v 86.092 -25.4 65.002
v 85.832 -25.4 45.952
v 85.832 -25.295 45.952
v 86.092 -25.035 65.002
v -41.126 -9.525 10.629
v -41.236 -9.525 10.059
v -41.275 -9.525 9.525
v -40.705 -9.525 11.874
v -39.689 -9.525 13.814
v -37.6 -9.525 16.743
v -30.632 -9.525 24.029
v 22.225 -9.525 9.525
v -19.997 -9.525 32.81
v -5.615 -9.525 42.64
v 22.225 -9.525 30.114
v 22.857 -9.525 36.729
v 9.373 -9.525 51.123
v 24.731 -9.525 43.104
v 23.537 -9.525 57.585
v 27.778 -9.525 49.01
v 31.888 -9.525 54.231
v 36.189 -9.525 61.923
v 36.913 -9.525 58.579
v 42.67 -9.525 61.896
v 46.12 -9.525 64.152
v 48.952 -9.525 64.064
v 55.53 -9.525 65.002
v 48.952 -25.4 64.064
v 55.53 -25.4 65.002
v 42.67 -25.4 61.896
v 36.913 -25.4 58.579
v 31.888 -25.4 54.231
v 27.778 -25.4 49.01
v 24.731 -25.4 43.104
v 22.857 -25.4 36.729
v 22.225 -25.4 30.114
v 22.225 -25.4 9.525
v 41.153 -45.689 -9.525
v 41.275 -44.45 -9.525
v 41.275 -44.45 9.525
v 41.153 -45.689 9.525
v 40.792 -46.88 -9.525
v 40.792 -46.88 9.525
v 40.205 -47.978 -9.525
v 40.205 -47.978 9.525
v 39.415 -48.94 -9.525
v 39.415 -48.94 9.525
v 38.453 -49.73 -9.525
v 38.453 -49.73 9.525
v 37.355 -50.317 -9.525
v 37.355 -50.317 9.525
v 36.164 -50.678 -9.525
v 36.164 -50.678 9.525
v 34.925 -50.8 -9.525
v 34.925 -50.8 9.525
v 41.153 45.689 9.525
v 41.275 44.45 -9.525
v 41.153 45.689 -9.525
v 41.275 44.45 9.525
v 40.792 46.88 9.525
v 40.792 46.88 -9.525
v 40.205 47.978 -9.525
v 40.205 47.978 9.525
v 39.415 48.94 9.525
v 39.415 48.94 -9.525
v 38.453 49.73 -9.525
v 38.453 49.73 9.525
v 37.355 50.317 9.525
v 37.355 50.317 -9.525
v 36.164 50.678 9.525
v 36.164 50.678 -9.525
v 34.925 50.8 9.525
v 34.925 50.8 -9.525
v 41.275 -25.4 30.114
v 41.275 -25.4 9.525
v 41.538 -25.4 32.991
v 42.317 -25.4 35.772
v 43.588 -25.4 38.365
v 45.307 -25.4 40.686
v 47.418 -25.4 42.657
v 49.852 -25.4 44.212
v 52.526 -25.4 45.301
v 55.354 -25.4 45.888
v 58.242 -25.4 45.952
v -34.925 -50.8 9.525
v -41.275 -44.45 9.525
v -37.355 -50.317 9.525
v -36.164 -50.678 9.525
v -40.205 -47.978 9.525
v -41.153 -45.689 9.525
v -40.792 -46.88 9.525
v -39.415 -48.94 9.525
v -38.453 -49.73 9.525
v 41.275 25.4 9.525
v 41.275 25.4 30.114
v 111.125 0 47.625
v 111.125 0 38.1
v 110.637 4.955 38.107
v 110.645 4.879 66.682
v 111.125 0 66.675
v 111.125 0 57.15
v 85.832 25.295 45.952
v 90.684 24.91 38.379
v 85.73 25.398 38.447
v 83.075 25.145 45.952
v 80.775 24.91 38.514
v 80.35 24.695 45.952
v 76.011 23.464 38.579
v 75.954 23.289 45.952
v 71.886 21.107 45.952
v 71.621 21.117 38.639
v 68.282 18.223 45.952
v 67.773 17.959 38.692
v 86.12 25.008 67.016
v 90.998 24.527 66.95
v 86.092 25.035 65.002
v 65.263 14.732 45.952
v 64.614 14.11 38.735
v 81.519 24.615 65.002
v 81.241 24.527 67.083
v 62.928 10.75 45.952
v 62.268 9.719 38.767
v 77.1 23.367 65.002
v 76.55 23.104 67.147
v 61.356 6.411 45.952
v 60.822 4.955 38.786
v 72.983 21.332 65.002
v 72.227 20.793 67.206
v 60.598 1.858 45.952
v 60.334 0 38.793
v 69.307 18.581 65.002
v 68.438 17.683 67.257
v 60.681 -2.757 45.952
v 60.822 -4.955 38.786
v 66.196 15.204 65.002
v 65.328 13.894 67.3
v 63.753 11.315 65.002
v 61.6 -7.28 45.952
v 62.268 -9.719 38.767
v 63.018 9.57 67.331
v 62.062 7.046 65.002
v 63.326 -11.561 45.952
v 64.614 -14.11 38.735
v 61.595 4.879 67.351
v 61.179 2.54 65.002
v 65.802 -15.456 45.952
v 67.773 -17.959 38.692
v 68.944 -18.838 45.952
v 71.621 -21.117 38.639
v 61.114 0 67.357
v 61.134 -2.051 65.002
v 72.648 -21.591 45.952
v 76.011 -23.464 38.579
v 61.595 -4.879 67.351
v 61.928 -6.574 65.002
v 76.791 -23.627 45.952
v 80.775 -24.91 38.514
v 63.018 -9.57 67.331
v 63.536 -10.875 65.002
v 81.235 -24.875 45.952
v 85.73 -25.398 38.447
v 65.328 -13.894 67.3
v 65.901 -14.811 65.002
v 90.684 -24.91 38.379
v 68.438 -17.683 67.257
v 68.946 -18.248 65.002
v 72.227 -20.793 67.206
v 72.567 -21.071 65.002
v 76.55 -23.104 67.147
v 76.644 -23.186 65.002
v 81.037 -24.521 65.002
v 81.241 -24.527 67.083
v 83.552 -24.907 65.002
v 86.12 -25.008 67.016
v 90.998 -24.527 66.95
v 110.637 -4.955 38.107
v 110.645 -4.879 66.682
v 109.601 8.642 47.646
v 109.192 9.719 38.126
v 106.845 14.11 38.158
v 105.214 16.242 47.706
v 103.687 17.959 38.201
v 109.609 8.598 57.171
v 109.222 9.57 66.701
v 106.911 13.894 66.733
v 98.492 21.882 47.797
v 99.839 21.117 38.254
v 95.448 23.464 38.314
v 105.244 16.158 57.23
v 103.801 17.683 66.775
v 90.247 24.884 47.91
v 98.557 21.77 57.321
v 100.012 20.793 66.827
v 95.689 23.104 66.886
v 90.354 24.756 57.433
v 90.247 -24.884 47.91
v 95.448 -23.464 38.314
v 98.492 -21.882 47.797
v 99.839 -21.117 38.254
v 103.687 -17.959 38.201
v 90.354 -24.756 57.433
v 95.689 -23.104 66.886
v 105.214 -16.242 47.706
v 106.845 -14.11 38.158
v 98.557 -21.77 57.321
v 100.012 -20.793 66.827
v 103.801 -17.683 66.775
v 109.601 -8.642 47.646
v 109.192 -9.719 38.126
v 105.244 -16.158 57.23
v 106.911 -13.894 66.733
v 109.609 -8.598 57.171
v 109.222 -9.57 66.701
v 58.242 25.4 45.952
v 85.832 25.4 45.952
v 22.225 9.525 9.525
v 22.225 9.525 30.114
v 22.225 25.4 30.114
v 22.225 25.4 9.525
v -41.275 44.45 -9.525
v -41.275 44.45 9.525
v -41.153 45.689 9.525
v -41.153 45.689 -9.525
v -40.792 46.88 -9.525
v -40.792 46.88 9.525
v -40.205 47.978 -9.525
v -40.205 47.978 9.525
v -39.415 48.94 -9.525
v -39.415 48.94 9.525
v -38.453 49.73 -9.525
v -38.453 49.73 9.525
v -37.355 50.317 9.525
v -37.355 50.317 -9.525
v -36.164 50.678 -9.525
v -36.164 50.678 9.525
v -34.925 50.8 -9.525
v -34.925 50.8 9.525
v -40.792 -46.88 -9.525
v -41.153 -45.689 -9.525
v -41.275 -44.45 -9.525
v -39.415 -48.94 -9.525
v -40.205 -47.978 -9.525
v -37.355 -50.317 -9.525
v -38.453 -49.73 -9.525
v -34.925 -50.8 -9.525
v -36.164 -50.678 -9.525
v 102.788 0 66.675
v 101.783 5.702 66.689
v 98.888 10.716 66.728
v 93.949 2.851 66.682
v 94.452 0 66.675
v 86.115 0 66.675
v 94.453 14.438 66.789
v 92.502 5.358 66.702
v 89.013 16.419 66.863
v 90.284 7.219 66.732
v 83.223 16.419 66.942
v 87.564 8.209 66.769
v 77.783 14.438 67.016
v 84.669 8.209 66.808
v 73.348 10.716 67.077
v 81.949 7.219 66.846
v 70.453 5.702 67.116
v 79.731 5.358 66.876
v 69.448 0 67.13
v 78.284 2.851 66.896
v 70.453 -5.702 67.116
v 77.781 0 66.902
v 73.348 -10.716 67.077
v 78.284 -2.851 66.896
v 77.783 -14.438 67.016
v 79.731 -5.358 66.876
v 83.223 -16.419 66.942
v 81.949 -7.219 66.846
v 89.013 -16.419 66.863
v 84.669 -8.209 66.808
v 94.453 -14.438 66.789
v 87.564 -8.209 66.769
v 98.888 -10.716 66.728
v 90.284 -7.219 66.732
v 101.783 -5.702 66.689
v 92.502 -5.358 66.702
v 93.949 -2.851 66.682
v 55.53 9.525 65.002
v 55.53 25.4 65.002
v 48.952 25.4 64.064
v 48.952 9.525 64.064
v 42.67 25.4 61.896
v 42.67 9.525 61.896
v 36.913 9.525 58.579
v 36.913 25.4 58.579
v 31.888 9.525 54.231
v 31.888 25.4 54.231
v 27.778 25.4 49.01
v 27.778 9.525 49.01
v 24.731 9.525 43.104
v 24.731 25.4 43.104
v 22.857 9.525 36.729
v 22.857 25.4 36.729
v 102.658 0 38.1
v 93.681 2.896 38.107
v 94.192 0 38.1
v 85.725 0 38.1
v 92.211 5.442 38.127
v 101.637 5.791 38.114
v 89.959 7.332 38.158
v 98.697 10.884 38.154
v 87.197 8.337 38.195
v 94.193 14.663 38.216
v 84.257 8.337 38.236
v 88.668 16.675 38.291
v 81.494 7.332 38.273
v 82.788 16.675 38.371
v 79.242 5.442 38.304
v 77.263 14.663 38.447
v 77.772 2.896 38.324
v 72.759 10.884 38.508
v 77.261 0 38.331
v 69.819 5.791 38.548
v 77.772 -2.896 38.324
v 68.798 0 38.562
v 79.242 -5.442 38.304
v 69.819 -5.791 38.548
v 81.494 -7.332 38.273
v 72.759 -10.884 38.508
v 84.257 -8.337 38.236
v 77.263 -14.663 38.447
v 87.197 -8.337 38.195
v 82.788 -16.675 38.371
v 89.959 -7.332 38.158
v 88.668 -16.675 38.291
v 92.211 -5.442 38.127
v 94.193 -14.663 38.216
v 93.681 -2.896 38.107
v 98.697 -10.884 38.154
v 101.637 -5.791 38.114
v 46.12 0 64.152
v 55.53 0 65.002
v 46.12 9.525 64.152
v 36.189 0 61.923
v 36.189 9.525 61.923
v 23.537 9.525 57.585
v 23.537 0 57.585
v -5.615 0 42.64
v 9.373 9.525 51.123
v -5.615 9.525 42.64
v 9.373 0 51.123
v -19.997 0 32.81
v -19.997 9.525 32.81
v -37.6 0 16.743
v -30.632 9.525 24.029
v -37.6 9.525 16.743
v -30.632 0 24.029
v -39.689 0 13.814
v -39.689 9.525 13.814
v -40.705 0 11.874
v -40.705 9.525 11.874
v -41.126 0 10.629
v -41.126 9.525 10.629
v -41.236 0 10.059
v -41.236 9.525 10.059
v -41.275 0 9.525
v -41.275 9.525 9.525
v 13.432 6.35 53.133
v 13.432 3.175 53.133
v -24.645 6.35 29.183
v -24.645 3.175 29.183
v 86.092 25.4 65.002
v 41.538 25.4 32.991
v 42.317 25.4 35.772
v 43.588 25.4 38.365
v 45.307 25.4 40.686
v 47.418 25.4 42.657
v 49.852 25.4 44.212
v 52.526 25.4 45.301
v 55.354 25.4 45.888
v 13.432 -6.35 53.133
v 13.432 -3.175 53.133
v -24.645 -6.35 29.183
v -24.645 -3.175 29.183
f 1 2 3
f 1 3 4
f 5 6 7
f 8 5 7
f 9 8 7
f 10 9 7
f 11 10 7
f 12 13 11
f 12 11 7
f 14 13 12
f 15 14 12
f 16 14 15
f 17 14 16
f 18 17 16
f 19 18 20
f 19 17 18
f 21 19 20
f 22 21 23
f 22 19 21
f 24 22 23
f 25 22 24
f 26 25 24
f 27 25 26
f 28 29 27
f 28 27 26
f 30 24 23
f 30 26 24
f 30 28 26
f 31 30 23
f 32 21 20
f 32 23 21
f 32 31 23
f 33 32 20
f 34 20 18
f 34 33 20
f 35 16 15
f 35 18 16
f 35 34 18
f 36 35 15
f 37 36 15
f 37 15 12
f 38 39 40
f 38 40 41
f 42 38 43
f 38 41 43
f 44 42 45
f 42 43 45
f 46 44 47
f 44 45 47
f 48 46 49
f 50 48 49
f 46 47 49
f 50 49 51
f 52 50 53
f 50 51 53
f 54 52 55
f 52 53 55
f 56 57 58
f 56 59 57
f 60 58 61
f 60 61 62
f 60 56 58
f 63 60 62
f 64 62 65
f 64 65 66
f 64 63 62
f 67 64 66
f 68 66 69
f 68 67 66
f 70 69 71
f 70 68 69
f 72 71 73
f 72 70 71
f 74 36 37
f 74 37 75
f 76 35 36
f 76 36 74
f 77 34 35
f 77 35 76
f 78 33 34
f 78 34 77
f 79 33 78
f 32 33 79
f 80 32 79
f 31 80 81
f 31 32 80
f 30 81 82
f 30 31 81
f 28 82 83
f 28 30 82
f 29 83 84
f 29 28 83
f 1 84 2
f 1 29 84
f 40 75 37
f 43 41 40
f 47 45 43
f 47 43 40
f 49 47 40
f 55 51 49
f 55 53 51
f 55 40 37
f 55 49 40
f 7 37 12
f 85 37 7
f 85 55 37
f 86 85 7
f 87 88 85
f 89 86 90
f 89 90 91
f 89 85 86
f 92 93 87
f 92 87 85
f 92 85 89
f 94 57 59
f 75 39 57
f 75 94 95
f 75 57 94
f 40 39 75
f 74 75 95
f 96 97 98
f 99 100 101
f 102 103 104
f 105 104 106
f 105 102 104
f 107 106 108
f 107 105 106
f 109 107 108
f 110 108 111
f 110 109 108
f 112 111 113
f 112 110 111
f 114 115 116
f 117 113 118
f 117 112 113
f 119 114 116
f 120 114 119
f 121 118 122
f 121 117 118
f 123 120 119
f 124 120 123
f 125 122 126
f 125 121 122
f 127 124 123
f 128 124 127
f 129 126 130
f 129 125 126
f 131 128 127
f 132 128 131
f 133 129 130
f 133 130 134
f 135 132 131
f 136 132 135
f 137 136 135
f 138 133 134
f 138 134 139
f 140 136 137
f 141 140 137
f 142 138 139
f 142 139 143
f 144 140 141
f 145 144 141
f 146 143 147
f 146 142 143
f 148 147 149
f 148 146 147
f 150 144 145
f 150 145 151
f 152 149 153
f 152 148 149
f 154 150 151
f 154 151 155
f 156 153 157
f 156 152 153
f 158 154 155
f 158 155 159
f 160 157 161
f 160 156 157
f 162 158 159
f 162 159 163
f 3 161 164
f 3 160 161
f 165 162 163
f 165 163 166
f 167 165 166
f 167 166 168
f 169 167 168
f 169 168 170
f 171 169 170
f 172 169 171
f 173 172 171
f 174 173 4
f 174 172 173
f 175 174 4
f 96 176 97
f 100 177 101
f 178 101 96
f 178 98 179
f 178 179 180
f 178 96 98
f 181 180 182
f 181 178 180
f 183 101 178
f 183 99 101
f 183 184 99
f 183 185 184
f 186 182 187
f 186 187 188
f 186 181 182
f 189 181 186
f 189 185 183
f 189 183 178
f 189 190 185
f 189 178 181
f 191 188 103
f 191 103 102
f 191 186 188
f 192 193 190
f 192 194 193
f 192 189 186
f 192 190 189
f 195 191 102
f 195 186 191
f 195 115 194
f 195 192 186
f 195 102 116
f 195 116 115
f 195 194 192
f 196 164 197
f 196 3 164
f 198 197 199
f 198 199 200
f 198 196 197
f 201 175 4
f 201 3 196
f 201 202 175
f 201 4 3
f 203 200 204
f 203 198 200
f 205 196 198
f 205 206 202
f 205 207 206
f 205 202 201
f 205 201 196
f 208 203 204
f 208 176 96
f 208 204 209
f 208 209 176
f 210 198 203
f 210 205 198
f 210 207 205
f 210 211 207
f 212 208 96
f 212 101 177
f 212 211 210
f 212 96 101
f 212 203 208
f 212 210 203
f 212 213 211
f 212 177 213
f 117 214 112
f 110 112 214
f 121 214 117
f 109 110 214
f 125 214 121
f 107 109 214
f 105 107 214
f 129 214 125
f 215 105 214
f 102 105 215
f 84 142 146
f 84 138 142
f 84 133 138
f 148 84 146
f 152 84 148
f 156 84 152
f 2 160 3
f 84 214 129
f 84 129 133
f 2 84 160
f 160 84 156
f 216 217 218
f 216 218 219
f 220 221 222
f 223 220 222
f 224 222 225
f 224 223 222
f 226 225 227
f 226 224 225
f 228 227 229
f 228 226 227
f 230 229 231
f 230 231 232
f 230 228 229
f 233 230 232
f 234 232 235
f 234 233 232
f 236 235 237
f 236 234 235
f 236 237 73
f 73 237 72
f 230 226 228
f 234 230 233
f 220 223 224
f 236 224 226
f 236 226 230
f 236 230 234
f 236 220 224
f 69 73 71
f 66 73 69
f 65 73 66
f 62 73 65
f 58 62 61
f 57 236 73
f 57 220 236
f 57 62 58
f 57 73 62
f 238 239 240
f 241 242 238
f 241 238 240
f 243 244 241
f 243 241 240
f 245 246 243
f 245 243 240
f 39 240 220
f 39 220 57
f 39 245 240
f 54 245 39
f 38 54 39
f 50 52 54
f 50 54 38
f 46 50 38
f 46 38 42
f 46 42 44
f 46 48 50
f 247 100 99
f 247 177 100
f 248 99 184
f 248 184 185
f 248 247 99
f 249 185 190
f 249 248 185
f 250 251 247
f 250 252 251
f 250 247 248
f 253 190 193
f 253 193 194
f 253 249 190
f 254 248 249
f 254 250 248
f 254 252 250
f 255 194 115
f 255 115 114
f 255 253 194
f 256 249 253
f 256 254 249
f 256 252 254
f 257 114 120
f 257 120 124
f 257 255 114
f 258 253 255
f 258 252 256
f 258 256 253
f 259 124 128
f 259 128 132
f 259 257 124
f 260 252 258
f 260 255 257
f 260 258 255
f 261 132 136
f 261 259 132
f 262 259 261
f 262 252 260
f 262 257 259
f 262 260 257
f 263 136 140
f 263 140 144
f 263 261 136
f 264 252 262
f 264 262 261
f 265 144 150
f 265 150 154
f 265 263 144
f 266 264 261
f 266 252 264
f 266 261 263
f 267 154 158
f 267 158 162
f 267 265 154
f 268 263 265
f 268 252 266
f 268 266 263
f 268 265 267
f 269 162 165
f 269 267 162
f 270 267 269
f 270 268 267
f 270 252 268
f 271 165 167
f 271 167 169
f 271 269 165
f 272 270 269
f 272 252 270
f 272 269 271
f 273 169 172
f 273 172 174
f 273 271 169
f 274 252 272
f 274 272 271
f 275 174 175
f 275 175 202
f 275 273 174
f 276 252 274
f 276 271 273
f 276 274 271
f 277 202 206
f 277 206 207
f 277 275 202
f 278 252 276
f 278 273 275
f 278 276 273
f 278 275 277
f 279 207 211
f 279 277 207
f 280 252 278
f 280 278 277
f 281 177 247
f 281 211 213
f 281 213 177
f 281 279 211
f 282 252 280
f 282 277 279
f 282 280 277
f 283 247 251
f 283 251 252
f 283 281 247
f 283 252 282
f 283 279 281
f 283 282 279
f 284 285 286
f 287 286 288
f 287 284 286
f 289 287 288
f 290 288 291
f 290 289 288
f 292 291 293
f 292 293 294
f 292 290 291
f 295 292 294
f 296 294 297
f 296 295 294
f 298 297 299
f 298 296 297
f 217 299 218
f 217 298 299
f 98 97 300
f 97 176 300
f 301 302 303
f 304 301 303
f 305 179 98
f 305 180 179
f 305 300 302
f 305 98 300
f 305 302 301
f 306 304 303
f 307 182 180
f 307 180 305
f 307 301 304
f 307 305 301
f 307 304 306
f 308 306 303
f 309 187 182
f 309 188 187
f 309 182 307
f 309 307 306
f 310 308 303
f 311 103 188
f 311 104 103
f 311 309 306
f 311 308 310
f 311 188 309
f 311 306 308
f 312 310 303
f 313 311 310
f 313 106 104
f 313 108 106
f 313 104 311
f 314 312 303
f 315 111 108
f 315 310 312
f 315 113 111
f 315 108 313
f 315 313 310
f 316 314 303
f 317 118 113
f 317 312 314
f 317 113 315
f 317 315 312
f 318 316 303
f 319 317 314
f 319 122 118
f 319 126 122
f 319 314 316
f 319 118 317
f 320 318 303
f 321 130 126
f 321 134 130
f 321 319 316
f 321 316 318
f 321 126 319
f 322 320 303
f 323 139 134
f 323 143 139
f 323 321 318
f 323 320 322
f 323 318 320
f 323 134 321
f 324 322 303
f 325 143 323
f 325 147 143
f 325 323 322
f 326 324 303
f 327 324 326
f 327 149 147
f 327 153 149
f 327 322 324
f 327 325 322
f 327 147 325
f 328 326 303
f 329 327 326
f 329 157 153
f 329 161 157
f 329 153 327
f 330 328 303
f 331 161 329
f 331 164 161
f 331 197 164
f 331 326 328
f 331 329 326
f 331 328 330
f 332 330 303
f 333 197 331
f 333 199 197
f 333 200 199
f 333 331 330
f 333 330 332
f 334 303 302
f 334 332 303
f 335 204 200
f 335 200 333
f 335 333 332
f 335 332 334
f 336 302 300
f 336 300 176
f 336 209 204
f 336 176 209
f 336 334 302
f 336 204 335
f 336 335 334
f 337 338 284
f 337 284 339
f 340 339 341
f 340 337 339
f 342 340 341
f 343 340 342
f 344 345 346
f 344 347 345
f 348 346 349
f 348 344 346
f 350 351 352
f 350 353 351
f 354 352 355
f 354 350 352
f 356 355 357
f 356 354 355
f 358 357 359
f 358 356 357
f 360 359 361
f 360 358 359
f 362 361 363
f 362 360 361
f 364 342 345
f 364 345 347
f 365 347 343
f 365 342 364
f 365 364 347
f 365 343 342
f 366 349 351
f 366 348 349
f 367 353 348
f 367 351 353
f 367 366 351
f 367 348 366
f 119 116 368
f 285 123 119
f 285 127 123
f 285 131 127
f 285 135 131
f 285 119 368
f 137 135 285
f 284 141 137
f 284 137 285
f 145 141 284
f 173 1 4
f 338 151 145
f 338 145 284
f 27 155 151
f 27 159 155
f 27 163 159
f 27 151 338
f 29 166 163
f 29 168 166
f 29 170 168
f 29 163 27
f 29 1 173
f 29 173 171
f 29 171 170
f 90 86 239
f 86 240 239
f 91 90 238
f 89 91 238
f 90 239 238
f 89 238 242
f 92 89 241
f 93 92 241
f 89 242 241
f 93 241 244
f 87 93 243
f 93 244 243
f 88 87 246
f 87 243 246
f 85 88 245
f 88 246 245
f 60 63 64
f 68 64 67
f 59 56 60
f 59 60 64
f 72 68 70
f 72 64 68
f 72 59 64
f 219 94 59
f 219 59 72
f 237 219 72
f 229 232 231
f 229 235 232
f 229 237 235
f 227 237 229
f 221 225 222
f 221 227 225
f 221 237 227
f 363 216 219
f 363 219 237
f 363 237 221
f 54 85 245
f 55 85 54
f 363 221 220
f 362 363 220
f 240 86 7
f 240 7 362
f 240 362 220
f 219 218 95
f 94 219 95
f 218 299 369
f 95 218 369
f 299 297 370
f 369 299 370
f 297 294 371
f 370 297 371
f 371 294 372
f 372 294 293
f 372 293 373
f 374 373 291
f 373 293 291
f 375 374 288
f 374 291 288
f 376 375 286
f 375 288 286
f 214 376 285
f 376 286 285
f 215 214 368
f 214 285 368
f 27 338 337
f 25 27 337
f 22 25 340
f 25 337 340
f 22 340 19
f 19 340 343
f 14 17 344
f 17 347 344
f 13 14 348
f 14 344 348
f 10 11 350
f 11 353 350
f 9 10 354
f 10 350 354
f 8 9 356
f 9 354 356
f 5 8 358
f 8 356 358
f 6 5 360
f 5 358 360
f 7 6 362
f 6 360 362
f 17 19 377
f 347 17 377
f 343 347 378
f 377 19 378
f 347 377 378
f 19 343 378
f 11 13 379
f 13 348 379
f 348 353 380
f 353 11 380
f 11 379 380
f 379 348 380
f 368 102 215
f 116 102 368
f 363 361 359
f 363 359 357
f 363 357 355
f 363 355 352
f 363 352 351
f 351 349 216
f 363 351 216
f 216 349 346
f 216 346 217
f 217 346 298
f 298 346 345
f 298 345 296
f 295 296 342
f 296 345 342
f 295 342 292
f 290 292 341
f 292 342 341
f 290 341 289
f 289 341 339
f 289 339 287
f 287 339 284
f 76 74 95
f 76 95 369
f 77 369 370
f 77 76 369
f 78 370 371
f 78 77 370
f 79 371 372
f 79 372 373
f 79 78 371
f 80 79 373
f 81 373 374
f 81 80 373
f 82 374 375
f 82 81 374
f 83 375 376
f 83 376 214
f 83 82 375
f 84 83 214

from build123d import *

# Parameters (mm, degrees)
F1_DEPTH = 25.4
F2_DEPTH = 50.8
F3_DEPTH = 9.525
F5_R     = 6.35


with BuildPart() as f1:
    # F0 (on Front) → F1 (new body, symmetric)
    with BuildSketch(Plane.XZ):
        Polygon((86.0920930787, 65.0018583123), (60.325, 65.0018583123), (60.325, 45.9518583123), (85.8321436333, 45.9518583123), align=None)
        with BuildLine():
            Line((22.225, 9.525), (41.275, 9.525))
            Line((41.275, 9.525), (41.275, 30.1144513303))
            ThreePointArc((41.275, 30.1144513303), (46.3175880369, 41.7193845943), (58.2418631259, 45.9518583123))
            Line((58.2418631259, 45.9518583123), (60.325, 45.9518583123))
            Line((60.325, 45.9518583123), (60.325, 65.0018583123))
            Line((60.325, 65.0018583123), (55.5299817685, 65.0018583123))
            ThreePointArc((55.5299817685, 65.0018583123), (31.8880250006, 54.2305920691), (22.225, 30.1144513303))
            Line((22.225, 30.1144513303), (22.225, 9.525))
        make_face()
    extrude(amount=F1_DEPTH, both=True)

    # F0 (on Front) → F2 (join, symmetric)
    with BuildSketch(Plane.XZ):
        Polygon((-41.275, 9.525), (-41.275, -9.525), (41.275, -9.525), (41.275, 9.525), (22.225, 9.525), align=None)
    extrude(amount=F2_DEPTH, both=True)

    # F0 (on Front) → F3 (join, symmetric)
    with BuildSketch(Plane.XZ):
        with BuildLine():
            add(Edge.make_bspline(
                [(55.5299817685, 65.0018583123), (17.2289203086, 64.6301832149), (-41.1762930453, 21.5798933059), (-41.275, 9.525)],
                knots=[0, 0, 0, 0, 111.5745773167, 111.5745773167, 111.5745773167, 111.5745773167], degree=3))
            Line((-41.275, 9.525), (22.225, 9.525))
            Line((22.225, 9.525), (22.225, 30.1144513303))
            ThreePointArc((22.225, 30.1144513303), (31.8880250006, 54.2305920691), (55.5299817685, 65.0018583123))
        make_face()
    extrude(amount=F3_DEPTH, both=True)

    # F0 (on Front) → F4 (revolve)
    with BuildSketch(Plane.XZ):
        Polygon((86.1149241681, 66.675), (86.0920930787, 65.0018583123), (85.8321436333, 45.9518583123), (85.725, 38.1), (111.125, 38.1), (111.125, 66.675), align=None)
    revolve(axis=Axis((85.9199620841, 0, 52.3875), (0.0136443699, 0, 0.9999069113)))

    # F5
    f5_edges = [f1.edges().sort_by_distance(p)[0] for p in [
        (41.275, -50.8, 0),
        (-41.275, -50.8, 0),
        (41.275, 50.8, 0),
        (-41.275, 50.8, 0),
    ]]
    fillet(f5_edges, radius=F5_R)


solid = f1.part
